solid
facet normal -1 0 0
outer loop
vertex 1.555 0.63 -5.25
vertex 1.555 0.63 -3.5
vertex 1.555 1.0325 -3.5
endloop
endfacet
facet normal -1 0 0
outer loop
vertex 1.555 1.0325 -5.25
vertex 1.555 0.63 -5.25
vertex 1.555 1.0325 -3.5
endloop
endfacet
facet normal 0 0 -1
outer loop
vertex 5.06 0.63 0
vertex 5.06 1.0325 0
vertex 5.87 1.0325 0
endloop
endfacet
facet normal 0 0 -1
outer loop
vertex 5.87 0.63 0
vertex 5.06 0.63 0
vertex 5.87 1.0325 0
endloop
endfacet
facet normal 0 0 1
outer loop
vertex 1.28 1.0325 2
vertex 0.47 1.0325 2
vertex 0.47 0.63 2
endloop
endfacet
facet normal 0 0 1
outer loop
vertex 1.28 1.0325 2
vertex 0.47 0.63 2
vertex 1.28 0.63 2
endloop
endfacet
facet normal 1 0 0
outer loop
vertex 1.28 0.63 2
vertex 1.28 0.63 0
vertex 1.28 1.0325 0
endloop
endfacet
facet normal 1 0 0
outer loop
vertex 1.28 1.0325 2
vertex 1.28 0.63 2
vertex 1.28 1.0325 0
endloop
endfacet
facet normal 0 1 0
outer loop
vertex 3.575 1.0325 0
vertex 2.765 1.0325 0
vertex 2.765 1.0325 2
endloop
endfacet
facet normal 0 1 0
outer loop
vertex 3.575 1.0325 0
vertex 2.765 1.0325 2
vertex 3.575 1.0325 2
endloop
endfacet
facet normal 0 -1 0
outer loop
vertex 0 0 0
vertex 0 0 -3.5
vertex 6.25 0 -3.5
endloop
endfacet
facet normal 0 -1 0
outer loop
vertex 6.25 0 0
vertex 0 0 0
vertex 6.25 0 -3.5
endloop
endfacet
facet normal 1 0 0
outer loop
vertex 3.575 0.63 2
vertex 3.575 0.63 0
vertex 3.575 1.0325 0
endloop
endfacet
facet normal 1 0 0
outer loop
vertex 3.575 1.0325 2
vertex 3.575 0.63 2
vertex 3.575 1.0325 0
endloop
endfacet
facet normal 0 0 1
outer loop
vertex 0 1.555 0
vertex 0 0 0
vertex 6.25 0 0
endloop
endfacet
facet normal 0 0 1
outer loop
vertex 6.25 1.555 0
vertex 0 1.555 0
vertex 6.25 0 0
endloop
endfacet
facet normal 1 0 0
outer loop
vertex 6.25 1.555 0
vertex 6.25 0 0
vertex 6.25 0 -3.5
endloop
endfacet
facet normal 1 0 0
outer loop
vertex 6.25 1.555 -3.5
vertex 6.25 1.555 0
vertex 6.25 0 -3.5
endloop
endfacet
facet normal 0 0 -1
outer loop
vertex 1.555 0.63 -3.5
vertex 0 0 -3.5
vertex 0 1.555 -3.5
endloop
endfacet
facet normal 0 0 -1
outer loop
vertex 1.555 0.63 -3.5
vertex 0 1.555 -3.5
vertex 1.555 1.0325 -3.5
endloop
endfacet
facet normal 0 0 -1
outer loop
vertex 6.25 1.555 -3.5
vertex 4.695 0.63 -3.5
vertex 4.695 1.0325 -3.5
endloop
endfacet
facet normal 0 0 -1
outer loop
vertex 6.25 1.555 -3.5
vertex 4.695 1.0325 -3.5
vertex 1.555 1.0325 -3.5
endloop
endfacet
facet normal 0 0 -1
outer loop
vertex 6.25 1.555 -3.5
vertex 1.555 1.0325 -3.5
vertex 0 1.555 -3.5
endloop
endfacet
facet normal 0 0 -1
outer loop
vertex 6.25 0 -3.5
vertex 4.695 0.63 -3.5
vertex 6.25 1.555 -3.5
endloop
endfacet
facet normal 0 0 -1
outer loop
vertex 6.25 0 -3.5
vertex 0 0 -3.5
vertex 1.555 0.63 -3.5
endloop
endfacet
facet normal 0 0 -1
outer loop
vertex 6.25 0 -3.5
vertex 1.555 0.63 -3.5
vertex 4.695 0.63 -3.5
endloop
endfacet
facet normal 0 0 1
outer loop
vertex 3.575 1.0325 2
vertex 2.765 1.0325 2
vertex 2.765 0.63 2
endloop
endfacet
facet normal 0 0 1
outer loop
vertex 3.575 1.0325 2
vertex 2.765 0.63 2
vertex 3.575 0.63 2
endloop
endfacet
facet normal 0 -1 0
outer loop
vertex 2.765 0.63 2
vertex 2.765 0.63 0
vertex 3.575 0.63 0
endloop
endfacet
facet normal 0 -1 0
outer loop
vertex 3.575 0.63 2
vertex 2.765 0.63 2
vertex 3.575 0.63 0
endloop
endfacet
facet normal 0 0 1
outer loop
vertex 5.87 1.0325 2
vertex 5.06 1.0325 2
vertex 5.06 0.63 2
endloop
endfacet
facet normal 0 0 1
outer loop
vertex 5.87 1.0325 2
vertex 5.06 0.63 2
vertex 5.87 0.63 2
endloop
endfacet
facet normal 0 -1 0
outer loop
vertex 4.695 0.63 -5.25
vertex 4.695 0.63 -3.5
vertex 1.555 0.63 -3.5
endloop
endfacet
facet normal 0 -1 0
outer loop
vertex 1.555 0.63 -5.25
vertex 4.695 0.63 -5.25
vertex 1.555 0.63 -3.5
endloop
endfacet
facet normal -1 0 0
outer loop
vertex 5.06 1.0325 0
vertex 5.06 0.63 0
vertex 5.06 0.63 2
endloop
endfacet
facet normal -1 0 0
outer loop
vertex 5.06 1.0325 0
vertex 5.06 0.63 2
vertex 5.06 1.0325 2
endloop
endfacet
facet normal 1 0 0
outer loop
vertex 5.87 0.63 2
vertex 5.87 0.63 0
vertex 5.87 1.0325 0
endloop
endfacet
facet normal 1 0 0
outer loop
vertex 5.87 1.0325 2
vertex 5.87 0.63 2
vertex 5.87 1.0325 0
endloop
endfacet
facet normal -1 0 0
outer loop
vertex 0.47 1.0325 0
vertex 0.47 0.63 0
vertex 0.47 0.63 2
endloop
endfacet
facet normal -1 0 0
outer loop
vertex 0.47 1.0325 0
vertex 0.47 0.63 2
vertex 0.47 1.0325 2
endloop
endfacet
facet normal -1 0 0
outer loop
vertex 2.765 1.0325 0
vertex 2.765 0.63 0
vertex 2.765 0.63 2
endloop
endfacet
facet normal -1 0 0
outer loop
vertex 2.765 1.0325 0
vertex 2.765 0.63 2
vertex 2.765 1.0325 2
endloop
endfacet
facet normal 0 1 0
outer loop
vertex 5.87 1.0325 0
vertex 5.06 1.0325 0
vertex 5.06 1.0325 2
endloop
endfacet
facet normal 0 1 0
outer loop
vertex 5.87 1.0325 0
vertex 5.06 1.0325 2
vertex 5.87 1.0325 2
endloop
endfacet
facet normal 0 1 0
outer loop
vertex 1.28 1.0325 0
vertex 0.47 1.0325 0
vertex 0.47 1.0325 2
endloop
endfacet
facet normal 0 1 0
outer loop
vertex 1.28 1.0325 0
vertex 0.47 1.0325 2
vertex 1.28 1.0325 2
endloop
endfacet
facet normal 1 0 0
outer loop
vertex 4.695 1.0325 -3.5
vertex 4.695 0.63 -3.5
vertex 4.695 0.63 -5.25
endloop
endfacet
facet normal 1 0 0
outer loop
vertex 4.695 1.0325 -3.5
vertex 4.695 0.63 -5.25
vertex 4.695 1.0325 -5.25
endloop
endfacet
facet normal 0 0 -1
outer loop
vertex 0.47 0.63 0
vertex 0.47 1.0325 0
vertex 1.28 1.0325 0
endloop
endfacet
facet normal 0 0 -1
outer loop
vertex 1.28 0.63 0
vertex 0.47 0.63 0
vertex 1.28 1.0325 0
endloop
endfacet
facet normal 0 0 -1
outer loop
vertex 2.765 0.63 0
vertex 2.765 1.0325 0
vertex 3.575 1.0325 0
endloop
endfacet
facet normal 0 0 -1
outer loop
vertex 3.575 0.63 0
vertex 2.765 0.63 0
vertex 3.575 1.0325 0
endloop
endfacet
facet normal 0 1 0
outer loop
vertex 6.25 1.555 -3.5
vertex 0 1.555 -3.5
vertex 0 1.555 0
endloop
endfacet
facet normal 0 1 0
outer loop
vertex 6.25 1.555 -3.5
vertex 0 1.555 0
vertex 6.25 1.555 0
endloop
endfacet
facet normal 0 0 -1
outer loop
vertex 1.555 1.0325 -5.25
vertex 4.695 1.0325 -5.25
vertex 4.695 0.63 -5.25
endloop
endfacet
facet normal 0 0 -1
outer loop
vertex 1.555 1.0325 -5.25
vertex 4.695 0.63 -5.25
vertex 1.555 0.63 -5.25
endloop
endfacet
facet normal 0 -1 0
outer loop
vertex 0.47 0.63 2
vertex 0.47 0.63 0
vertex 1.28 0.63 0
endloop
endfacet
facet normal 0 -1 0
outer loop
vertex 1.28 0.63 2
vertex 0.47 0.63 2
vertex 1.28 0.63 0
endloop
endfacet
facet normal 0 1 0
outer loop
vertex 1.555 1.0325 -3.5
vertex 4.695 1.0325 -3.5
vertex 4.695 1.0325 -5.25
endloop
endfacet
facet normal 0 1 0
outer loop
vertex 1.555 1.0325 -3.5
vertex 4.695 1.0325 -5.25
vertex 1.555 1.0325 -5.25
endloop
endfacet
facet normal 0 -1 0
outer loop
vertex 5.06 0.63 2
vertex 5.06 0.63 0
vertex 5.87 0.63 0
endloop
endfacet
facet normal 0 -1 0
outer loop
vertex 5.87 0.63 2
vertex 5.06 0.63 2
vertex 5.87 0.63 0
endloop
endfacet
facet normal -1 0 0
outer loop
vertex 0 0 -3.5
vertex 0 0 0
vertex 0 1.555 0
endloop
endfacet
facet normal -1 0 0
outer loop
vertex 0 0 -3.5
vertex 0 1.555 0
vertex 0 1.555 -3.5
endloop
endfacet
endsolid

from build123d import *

# Parameters (mm, degrees)
SKETCH1_W             = 6.25
SKETCH1_H             = 3.5
BOSS_EXTRUDE1_DEPTH   = 1.555
SKETCH2_W             = 0.81
SKETCH2_H             = 0.4025
BOSS_EXTRUDE8_DEPTH   = 2
BOSS_EXTRUDE8_2_DEPTH = 2
BOSS_EXTRUDE8_3_DEPTH = 2
SKETCH7_W             = 3.14
SKETCH7_H             = 0.4025
BOSS_EXTRUDE9_DEPTH   = 1.75


with BuildPart() as part:
    # Sketch1 → Boss-Extrude1 (new body)
    with BuildSketch(Plane(origin=(0, 0, 0), x_dir=(1, 0, 0), z_dir=(0, 1, 0))):
        with Locations((3.125, 1.75)):
            Rectangle(SKETCH1_W, SKETCH1_H)
    extrude(amount=BOSS_EXTRUDE1_DEPTH)

    # Sketch7 → Boss-Extrude9 (add)
    with BuildSketch(Plane(origin=(0, 0, -3.5), x_dir=(-1, 0, 0), z_dir=(0, 0, -1))):
        with Locations((-3.125, 0.83125)):
            Rectangle(SKETCH7_W, SKETCH7_H)
    extrude(amount=BOSS_EXTRUDE9_DEPTH)


with BuildPart() as body_2:
    # Sketch2 → Boss-Extrude8 (new body)
    with BuildSketch(Plane.XY):
        with Locations((0.875, 0.83125)):
            Rectangle(SKETCH2_W, SKETCH2_H)
    extrude(amount=BOSS_EXTRUDE8_DEPTH)


with BuildPart() as body_3:
    # Sketch2 → Boss-Extrude8 2 (new body)
    with BuildSketch(Plane.XY):
        with Locations((3.17, 0.83125)):
            Rectangle(SKETCH2_W, SKETCH2_H)
    extrude(amount=BOSS_EXTRUDE8_2_DEPTH)


with BuildPart() as body_4:
    # Sketch2 → Boss-Extrude8 3 (new body)
    with BuildSketch(Plane.XY):
        with Locations((5.465, 0.83125)):
            Rectangle(SKETCH2_W, SKETCH2_H)
    extrude(amount=BOSS_EXTRUDE8_3_DEPTH)


solid = Compound([part.part, body_2.part, body_3.part, body_4.part])
